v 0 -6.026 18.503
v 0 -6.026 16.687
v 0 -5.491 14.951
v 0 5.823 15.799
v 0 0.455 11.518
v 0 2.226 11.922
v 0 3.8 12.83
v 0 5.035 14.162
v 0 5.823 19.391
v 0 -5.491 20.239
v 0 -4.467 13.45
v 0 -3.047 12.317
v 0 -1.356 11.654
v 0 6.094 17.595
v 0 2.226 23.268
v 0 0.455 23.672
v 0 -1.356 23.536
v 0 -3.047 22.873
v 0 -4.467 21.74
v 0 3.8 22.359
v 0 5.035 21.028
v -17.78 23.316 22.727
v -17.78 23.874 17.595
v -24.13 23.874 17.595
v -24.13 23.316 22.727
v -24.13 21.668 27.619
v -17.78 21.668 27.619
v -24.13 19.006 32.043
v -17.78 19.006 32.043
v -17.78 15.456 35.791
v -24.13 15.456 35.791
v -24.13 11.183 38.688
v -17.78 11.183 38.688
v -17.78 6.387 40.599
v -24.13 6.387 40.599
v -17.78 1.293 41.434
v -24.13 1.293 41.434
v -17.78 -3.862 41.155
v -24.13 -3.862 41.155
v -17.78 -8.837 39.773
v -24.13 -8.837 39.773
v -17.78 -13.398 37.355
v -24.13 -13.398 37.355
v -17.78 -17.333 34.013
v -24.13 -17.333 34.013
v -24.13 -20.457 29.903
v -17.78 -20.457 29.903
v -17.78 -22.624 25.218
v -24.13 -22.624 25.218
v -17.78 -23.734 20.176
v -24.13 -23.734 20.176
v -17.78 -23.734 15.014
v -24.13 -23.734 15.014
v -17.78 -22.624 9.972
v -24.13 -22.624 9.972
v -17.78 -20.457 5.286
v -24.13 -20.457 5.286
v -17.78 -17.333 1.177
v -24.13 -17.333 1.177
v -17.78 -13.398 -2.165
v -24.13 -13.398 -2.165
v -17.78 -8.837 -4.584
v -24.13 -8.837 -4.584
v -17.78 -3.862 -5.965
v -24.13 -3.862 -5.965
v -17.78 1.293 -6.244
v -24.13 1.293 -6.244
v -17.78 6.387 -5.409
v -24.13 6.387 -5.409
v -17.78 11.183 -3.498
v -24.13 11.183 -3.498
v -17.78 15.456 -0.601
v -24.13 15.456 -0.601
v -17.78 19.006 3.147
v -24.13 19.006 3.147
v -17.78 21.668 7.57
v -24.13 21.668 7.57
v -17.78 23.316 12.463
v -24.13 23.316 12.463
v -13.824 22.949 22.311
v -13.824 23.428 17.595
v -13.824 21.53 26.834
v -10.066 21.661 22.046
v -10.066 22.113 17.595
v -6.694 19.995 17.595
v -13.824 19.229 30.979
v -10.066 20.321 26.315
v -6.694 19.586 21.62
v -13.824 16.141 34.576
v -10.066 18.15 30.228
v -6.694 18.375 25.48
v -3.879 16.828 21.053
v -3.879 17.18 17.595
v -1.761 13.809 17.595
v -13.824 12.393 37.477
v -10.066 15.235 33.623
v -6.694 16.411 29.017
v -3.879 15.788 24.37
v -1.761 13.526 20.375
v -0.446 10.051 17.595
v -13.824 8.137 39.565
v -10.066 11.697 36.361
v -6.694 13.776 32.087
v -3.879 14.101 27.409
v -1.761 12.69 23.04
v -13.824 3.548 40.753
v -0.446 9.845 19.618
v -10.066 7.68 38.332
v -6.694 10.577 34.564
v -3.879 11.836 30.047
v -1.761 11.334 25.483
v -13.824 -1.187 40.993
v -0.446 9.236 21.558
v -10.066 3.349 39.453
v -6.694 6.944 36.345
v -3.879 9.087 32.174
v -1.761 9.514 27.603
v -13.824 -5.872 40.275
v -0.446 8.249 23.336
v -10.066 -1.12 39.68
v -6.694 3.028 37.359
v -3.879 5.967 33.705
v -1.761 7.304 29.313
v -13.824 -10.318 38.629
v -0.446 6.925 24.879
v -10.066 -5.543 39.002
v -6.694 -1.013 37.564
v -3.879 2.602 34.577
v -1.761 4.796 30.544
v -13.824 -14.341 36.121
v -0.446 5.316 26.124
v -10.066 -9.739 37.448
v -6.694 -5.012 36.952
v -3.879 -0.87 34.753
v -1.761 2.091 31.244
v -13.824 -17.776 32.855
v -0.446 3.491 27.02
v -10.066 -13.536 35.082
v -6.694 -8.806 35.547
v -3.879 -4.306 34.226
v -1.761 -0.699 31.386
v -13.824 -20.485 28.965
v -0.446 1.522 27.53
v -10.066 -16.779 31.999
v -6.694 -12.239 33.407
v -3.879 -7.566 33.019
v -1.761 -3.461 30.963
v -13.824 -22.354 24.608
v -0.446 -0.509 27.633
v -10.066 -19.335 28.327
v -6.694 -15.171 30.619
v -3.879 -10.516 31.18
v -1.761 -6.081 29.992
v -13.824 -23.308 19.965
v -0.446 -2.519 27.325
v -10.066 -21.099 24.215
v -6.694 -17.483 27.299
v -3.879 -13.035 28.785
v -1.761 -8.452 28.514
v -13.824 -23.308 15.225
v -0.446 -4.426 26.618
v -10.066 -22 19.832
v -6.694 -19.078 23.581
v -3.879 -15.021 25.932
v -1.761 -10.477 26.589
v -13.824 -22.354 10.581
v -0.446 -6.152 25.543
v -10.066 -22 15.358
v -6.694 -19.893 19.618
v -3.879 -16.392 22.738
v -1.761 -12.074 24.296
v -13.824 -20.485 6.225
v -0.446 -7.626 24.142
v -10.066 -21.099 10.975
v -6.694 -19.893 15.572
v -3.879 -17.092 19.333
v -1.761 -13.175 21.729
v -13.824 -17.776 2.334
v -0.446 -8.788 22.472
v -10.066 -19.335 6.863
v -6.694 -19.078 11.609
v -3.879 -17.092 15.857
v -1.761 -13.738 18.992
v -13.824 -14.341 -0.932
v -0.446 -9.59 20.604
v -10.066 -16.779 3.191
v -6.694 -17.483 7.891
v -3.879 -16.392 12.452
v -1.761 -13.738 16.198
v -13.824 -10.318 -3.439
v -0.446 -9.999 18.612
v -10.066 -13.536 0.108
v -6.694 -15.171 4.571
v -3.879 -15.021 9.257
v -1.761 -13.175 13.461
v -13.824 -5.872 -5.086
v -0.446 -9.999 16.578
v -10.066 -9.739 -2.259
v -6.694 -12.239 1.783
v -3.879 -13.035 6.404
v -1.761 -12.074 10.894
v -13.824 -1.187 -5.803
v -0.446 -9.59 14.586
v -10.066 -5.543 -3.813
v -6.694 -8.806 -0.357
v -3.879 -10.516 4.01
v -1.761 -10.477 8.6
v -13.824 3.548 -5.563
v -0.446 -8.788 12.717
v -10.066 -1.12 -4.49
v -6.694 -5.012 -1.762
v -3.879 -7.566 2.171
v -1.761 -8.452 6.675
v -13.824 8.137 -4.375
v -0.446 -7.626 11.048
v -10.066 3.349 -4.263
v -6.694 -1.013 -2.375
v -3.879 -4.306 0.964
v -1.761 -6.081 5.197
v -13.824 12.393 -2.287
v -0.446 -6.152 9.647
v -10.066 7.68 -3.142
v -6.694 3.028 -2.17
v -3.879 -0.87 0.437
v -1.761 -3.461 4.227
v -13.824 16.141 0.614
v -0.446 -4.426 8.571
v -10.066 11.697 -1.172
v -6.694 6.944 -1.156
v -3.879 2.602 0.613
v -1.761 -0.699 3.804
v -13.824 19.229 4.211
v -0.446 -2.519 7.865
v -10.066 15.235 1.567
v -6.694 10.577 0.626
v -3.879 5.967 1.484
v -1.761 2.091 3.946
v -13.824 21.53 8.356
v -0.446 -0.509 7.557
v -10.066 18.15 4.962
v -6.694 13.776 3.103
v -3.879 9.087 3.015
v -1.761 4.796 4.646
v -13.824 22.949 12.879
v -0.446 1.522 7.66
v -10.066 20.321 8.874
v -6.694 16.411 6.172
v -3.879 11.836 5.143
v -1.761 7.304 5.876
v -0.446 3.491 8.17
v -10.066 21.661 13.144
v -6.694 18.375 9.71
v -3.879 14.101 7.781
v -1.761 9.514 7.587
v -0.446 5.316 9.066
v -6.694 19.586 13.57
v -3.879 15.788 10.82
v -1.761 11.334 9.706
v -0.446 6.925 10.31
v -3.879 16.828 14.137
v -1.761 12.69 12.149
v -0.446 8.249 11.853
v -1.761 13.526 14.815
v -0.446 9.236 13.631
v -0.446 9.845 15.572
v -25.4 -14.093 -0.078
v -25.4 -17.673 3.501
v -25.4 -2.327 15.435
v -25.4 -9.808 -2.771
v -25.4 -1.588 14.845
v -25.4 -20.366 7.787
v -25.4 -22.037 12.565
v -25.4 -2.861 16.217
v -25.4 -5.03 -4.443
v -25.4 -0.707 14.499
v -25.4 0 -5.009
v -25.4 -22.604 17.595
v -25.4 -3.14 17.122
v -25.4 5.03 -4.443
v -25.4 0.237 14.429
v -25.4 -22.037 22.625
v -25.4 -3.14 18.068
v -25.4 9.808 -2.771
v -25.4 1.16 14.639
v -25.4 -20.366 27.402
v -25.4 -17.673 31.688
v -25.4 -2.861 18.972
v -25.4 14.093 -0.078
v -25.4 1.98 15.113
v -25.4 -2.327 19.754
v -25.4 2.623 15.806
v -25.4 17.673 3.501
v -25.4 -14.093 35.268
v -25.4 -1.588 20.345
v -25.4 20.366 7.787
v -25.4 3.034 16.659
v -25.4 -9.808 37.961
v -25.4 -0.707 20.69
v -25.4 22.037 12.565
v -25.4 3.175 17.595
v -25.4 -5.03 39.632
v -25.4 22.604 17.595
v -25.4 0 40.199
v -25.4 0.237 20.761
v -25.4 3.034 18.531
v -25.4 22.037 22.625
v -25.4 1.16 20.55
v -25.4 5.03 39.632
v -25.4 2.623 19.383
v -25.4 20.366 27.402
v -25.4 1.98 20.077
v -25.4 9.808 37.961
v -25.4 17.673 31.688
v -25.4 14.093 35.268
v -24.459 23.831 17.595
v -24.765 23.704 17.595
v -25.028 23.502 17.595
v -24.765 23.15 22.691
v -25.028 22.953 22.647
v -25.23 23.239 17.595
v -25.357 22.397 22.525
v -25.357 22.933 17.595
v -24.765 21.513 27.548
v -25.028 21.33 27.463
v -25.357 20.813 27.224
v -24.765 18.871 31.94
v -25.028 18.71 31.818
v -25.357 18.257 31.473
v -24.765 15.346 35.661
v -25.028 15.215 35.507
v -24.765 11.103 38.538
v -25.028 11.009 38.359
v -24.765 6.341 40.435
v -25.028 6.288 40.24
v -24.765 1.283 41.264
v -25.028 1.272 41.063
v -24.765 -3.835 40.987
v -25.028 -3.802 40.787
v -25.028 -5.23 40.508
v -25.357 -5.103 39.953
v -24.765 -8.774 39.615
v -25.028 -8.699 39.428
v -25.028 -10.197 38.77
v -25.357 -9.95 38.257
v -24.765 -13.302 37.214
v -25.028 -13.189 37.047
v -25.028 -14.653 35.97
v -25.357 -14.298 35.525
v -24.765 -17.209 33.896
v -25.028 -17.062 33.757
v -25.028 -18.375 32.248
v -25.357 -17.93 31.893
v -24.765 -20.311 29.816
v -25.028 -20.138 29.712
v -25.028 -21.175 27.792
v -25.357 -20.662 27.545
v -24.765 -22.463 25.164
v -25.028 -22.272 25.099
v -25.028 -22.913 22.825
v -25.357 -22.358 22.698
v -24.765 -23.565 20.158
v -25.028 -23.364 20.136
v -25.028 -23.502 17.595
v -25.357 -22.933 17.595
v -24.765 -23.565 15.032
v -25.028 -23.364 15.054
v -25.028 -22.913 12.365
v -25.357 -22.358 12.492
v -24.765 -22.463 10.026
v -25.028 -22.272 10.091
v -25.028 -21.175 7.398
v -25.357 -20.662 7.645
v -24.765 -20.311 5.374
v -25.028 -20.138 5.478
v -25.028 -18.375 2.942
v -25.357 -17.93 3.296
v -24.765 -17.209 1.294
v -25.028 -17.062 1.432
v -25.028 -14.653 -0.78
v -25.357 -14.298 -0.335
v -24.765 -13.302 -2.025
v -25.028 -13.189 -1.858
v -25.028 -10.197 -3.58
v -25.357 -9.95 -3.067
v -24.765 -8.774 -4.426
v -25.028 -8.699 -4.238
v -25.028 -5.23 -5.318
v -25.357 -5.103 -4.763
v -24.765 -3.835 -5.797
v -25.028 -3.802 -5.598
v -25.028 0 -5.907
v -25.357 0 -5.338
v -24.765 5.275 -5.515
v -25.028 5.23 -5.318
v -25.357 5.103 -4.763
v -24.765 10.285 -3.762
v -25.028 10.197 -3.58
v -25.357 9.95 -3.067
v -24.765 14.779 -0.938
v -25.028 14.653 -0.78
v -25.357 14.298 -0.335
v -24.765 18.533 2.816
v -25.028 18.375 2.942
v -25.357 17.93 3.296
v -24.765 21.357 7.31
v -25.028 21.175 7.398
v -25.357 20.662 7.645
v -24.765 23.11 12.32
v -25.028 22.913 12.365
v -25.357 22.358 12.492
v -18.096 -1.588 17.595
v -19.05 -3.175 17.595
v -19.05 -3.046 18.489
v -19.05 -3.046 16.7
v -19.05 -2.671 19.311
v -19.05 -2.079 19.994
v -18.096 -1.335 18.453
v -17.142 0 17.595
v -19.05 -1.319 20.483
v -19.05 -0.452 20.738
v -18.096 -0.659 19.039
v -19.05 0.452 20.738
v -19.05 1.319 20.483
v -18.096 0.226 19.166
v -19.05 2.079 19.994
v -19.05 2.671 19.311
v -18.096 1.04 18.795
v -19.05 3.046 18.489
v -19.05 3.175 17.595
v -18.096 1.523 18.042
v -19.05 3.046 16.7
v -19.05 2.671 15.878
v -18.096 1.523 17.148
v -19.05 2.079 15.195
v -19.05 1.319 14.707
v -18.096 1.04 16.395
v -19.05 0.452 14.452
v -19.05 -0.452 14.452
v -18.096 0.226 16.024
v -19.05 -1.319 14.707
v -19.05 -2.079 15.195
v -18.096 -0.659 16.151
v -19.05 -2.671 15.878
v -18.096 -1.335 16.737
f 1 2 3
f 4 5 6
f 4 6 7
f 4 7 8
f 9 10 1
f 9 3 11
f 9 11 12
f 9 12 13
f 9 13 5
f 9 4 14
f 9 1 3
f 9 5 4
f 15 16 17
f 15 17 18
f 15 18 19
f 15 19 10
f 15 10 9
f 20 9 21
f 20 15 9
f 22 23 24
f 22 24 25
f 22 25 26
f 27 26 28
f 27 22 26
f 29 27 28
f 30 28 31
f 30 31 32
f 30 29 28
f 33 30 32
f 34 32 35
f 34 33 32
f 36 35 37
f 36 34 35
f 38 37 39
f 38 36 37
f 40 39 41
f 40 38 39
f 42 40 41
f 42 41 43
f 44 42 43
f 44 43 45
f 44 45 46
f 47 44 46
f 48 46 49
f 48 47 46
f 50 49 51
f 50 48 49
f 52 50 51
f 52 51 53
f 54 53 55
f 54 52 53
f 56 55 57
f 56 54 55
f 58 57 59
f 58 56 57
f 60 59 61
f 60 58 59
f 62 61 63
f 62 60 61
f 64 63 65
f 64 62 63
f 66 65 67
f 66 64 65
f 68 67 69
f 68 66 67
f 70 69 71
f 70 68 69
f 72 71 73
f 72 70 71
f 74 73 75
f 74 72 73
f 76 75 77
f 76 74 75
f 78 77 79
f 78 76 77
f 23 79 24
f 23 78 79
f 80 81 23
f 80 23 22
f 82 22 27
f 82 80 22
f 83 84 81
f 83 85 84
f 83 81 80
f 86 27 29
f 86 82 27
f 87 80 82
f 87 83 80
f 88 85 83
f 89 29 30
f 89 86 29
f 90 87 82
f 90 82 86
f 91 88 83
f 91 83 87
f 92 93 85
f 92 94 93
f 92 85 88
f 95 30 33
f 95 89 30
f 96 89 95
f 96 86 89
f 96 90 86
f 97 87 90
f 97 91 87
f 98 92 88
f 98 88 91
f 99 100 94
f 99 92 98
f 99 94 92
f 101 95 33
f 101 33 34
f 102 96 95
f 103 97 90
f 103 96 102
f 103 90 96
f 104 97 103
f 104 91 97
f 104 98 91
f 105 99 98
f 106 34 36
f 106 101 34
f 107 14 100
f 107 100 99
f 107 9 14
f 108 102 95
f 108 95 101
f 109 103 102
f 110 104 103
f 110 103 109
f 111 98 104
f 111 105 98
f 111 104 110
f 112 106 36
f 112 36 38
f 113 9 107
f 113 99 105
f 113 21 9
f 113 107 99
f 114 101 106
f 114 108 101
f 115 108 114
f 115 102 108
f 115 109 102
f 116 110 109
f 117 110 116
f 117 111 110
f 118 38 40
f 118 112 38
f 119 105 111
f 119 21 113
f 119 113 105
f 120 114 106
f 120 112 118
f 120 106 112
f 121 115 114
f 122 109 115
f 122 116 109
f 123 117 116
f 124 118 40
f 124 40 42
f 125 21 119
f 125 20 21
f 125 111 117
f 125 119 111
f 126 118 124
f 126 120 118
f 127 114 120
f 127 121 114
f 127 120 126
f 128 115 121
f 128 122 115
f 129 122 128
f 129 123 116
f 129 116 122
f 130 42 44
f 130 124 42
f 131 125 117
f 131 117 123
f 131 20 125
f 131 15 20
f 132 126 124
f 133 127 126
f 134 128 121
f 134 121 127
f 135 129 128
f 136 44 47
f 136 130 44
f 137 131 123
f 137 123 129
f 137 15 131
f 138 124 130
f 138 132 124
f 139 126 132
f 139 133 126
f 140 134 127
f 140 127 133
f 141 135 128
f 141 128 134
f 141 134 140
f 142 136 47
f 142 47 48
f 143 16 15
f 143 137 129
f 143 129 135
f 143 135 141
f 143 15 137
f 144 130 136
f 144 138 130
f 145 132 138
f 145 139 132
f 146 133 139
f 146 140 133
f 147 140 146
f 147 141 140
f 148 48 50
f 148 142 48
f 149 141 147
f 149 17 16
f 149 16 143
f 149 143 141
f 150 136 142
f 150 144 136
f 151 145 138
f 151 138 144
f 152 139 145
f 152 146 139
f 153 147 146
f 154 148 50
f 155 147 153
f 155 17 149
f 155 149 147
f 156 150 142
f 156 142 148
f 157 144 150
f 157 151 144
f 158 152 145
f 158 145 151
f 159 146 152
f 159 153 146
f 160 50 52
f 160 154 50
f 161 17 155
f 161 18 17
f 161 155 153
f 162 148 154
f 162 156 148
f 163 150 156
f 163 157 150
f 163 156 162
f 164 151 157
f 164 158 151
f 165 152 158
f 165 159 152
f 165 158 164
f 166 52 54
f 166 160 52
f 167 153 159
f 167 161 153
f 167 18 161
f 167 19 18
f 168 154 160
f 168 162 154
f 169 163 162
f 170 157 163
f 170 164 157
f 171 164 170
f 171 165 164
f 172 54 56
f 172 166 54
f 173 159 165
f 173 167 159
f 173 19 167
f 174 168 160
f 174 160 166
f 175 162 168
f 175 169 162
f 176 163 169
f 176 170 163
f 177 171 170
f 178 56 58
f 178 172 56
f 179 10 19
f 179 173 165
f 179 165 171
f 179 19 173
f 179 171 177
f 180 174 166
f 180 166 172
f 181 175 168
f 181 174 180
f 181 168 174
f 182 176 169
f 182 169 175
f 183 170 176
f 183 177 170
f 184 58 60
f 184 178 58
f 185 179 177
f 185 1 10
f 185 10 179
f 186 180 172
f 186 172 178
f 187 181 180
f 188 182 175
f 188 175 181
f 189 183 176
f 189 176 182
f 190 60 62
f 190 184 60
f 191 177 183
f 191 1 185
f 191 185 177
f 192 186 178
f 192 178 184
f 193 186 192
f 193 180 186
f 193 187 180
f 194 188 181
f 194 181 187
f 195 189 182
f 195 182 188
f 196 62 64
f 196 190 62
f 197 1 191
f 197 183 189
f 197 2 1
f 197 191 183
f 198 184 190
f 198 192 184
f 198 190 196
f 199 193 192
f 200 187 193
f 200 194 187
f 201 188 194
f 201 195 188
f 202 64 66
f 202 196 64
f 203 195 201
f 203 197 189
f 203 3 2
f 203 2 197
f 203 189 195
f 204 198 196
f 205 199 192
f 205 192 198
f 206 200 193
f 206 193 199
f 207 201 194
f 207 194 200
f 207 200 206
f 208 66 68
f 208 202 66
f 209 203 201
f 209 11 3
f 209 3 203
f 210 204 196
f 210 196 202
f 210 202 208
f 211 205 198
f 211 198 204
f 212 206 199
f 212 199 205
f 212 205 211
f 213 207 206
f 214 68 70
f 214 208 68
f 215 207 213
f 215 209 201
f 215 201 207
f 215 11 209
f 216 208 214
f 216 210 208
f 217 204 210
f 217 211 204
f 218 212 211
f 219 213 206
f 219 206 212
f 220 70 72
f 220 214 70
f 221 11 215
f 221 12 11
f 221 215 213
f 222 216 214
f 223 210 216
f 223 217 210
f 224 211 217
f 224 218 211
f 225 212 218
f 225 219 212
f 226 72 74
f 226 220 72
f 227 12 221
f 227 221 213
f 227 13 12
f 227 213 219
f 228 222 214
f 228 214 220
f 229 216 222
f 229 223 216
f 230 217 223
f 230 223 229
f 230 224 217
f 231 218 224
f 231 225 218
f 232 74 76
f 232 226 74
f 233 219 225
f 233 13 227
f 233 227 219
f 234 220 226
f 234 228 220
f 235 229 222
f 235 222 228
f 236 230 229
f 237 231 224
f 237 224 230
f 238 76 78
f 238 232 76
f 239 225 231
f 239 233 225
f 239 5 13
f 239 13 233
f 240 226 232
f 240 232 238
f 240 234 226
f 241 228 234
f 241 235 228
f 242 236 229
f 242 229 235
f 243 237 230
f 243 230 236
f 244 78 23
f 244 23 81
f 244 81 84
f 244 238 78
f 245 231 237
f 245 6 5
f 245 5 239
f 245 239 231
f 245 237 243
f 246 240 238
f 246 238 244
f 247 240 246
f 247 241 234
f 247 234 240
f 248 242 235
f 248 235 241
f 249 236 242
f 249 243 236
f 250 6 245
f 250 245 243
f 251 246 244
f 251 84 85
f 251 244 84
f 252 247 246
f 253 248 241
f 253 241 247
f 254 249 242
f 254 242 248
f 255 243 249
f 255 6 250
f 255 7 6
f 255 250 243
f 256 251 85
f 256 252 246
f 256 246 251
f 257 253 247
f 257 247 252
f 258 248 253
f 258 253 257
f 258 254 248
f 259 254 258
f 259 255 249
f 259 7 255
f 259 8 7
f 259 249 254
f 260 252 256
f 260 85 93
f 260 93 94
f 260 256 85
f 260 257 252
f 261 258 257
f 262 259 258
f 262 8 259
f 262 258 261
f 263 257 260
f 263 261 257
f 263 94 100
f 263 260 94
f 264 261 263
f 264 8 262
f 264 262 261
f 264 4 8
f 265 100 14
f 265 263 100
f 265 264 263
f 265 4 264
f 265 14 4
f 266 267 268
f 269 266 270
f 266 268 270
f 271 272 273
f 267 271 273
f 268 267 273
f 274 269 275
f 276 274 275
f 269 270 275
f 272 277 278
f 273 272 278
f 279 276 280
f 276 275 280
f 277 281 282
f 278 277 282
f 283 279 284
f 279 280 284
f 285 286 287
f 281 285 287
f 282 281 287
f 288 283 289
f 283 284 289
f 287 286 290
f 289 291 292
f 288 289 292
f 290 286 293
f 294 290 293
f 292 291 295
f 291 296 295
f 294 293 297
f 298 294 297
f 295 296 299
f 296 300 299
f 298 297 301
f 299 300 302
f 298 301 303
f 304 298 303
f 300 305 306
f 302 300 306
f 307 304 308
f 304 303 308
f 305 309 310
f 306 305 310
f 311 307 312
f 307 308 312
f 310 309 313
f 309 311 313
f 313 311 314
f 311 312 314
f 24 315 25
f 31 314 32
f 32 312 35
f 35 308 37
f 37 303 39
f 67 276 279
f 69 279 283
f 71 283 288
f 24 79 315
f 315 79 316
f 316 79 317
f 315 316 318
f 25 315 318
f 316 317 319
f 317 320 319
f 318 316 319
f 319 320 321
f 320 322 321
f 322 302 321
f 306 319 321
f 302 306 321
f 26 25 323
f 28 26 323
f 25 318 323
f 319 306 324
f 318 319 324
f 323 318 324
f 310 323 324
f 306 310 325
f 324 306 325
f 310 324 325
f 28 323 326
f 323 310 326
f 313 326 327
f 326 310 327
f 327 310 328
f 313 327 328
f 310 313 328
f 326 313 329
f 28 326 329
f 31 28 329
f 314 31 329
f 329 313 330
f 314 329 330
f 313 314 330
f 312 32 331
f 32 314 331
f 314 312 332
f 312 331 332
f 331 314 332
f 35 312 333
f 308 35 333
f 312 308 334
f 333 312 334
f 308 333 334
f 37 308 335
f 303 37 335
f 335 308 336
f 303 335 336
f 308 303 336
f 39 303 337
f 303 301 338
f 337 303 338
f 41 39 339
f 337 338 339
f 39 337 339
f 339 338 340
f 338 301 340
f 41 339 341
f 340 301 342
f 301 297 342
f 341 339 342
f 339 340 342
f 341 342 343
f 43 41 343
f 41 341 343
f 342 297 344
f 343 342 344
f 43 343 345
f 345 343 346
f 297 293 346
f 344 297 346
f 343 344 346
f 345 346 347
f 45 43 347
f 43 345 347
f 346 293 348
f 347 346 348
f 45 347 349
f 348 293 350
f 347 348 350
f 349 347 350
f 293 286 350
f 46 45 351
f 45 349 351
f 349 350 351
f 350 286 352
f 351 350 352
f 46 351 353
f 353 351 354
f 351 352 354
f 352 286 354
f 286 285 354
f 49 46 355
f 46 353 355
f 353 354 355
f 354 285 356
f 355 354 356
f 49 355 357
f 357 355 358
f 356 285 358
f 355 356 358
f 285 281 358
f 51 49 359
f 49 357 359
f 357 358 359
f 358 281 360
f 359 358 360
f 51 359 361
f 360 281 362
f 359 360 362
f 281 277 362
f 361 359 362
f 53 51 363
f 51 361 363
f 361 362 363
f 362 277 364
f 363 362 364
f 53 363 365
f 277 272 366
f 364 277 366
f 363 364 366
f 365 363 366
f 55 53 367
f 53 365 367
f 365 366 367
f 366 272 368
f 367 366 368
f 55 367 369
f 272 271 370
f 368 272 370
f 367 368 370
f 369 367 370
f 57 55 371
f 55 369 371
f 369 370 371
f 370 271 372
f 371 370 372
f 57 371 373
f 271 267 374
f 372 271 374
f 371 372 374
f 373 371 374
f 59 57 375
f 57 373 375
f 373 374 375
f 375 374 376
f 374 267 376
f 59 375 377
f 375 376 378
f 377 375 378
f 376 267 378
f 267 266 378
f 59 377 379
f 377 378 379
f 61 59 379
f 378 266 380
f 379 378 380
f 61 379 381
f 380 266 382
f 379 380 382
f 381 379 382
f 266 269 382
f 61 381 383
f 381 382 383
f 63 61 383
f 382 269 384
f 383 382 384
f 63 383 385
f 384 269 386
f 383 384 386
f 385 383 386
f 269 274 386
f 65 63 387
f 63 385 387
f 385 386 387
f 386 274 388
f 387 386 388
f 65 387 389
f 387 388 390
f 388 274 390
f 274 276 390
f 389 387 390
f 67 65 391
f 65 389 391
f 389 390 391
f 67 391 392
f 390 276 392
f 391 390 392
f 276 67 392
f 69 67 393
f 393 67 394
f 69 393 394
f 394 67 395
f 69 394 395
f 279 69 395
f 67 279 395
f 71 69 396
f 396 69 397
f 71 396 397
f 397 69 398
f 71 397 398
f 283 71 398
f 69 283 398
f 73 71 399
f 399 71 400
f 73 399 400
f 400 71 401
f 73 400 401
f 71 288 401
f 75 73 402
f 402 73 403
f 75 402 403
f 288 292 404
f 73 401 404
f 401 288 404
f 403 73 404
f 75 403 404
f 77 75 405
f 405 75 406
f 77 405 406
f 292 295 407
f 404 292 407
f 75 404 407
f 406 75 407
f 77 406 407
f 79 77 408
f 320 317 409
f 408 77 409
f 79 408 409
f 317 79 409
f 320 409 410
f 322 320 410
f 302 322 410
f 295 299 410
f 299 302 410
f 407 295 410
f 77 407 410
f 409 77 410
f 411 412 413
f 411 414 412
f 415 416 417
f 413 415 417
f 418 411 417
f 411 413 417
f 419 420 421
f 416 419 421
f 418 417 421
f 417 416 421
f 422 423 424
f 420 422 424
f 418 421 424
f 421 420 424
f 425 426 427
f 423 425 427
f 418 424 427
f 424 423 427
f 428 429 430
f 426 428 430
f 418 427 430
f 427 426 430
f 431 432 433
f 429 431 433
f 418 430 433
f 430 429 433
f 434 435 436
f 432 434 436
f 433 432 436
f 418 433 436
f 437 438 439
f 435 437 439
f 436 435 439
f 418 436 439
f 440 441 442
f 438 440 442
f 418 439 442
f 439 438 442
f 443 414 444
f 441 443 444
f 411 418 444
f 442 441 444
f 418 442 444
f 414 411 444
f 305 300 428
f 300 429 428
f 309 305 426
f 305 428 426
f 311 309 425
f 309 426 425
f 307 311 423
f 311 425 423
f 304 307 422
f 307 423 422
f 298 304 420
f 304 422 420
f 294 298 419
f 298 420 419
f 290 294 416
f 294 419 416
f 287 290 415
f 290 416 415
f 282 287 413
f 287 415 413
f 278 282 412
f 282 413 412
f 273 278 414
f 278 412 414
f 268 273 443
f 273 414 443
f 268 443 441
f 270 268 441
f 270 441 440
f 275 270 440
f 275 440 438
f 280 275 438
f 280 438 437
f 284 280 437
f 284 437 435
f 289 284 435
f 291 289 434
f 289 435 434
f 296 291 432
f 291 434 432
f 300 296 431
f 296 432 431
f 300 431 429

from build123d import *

# Parameters (mm, degrees)
F0_R     = 23.8741589036
F1_DEPTH = 25.4
F2_R     = 17.78
F4_D     = 6.35
F4_DEPTH = 6.35
F4_TIP   = 1.9077324654
F5_R     = 1.27


with BuildPart() as f1:
    # F0 (on Right) → F1 (new body)
    with BuildSketch(Plane.YZ):
        with Locations((0, 17.5948925316)):
            Circle(F0_R)
    extrude(amount=-F1_DEPTH)

    # F2
    f2_edges = [f1.edges().sort_by_distance(p)[0] for p in [
        (0, -23.874159, 17.594893),
    ]]
    fillet(f2_edges, radius=F2_R)

    # F4
    with Locations(Plane(origin=(-25.4, 0, 0), x_dir=(0, -1, 0), z_dir=(-1, 0, 0))):
        with Locations((0, 17.5948925316)):
            Hole(F4_D / 2, depth=F4_DEPTH)
            with Locations((0, 0, -(F4_DEPTH + F4_TIP / 2))):  # 118° drill point
                Cone(0, F4_D / 2, F4_TIP, mode=Mode.SUBTRACT)

    # F5
    f5_edges = [f1.edges().sort_by_distance(p)[0] for p in [
        (-25.4, -23.874159, 17.594893),
    ]]
    fillet(f5_edges, radius=F5_R)


solid = f1.part
